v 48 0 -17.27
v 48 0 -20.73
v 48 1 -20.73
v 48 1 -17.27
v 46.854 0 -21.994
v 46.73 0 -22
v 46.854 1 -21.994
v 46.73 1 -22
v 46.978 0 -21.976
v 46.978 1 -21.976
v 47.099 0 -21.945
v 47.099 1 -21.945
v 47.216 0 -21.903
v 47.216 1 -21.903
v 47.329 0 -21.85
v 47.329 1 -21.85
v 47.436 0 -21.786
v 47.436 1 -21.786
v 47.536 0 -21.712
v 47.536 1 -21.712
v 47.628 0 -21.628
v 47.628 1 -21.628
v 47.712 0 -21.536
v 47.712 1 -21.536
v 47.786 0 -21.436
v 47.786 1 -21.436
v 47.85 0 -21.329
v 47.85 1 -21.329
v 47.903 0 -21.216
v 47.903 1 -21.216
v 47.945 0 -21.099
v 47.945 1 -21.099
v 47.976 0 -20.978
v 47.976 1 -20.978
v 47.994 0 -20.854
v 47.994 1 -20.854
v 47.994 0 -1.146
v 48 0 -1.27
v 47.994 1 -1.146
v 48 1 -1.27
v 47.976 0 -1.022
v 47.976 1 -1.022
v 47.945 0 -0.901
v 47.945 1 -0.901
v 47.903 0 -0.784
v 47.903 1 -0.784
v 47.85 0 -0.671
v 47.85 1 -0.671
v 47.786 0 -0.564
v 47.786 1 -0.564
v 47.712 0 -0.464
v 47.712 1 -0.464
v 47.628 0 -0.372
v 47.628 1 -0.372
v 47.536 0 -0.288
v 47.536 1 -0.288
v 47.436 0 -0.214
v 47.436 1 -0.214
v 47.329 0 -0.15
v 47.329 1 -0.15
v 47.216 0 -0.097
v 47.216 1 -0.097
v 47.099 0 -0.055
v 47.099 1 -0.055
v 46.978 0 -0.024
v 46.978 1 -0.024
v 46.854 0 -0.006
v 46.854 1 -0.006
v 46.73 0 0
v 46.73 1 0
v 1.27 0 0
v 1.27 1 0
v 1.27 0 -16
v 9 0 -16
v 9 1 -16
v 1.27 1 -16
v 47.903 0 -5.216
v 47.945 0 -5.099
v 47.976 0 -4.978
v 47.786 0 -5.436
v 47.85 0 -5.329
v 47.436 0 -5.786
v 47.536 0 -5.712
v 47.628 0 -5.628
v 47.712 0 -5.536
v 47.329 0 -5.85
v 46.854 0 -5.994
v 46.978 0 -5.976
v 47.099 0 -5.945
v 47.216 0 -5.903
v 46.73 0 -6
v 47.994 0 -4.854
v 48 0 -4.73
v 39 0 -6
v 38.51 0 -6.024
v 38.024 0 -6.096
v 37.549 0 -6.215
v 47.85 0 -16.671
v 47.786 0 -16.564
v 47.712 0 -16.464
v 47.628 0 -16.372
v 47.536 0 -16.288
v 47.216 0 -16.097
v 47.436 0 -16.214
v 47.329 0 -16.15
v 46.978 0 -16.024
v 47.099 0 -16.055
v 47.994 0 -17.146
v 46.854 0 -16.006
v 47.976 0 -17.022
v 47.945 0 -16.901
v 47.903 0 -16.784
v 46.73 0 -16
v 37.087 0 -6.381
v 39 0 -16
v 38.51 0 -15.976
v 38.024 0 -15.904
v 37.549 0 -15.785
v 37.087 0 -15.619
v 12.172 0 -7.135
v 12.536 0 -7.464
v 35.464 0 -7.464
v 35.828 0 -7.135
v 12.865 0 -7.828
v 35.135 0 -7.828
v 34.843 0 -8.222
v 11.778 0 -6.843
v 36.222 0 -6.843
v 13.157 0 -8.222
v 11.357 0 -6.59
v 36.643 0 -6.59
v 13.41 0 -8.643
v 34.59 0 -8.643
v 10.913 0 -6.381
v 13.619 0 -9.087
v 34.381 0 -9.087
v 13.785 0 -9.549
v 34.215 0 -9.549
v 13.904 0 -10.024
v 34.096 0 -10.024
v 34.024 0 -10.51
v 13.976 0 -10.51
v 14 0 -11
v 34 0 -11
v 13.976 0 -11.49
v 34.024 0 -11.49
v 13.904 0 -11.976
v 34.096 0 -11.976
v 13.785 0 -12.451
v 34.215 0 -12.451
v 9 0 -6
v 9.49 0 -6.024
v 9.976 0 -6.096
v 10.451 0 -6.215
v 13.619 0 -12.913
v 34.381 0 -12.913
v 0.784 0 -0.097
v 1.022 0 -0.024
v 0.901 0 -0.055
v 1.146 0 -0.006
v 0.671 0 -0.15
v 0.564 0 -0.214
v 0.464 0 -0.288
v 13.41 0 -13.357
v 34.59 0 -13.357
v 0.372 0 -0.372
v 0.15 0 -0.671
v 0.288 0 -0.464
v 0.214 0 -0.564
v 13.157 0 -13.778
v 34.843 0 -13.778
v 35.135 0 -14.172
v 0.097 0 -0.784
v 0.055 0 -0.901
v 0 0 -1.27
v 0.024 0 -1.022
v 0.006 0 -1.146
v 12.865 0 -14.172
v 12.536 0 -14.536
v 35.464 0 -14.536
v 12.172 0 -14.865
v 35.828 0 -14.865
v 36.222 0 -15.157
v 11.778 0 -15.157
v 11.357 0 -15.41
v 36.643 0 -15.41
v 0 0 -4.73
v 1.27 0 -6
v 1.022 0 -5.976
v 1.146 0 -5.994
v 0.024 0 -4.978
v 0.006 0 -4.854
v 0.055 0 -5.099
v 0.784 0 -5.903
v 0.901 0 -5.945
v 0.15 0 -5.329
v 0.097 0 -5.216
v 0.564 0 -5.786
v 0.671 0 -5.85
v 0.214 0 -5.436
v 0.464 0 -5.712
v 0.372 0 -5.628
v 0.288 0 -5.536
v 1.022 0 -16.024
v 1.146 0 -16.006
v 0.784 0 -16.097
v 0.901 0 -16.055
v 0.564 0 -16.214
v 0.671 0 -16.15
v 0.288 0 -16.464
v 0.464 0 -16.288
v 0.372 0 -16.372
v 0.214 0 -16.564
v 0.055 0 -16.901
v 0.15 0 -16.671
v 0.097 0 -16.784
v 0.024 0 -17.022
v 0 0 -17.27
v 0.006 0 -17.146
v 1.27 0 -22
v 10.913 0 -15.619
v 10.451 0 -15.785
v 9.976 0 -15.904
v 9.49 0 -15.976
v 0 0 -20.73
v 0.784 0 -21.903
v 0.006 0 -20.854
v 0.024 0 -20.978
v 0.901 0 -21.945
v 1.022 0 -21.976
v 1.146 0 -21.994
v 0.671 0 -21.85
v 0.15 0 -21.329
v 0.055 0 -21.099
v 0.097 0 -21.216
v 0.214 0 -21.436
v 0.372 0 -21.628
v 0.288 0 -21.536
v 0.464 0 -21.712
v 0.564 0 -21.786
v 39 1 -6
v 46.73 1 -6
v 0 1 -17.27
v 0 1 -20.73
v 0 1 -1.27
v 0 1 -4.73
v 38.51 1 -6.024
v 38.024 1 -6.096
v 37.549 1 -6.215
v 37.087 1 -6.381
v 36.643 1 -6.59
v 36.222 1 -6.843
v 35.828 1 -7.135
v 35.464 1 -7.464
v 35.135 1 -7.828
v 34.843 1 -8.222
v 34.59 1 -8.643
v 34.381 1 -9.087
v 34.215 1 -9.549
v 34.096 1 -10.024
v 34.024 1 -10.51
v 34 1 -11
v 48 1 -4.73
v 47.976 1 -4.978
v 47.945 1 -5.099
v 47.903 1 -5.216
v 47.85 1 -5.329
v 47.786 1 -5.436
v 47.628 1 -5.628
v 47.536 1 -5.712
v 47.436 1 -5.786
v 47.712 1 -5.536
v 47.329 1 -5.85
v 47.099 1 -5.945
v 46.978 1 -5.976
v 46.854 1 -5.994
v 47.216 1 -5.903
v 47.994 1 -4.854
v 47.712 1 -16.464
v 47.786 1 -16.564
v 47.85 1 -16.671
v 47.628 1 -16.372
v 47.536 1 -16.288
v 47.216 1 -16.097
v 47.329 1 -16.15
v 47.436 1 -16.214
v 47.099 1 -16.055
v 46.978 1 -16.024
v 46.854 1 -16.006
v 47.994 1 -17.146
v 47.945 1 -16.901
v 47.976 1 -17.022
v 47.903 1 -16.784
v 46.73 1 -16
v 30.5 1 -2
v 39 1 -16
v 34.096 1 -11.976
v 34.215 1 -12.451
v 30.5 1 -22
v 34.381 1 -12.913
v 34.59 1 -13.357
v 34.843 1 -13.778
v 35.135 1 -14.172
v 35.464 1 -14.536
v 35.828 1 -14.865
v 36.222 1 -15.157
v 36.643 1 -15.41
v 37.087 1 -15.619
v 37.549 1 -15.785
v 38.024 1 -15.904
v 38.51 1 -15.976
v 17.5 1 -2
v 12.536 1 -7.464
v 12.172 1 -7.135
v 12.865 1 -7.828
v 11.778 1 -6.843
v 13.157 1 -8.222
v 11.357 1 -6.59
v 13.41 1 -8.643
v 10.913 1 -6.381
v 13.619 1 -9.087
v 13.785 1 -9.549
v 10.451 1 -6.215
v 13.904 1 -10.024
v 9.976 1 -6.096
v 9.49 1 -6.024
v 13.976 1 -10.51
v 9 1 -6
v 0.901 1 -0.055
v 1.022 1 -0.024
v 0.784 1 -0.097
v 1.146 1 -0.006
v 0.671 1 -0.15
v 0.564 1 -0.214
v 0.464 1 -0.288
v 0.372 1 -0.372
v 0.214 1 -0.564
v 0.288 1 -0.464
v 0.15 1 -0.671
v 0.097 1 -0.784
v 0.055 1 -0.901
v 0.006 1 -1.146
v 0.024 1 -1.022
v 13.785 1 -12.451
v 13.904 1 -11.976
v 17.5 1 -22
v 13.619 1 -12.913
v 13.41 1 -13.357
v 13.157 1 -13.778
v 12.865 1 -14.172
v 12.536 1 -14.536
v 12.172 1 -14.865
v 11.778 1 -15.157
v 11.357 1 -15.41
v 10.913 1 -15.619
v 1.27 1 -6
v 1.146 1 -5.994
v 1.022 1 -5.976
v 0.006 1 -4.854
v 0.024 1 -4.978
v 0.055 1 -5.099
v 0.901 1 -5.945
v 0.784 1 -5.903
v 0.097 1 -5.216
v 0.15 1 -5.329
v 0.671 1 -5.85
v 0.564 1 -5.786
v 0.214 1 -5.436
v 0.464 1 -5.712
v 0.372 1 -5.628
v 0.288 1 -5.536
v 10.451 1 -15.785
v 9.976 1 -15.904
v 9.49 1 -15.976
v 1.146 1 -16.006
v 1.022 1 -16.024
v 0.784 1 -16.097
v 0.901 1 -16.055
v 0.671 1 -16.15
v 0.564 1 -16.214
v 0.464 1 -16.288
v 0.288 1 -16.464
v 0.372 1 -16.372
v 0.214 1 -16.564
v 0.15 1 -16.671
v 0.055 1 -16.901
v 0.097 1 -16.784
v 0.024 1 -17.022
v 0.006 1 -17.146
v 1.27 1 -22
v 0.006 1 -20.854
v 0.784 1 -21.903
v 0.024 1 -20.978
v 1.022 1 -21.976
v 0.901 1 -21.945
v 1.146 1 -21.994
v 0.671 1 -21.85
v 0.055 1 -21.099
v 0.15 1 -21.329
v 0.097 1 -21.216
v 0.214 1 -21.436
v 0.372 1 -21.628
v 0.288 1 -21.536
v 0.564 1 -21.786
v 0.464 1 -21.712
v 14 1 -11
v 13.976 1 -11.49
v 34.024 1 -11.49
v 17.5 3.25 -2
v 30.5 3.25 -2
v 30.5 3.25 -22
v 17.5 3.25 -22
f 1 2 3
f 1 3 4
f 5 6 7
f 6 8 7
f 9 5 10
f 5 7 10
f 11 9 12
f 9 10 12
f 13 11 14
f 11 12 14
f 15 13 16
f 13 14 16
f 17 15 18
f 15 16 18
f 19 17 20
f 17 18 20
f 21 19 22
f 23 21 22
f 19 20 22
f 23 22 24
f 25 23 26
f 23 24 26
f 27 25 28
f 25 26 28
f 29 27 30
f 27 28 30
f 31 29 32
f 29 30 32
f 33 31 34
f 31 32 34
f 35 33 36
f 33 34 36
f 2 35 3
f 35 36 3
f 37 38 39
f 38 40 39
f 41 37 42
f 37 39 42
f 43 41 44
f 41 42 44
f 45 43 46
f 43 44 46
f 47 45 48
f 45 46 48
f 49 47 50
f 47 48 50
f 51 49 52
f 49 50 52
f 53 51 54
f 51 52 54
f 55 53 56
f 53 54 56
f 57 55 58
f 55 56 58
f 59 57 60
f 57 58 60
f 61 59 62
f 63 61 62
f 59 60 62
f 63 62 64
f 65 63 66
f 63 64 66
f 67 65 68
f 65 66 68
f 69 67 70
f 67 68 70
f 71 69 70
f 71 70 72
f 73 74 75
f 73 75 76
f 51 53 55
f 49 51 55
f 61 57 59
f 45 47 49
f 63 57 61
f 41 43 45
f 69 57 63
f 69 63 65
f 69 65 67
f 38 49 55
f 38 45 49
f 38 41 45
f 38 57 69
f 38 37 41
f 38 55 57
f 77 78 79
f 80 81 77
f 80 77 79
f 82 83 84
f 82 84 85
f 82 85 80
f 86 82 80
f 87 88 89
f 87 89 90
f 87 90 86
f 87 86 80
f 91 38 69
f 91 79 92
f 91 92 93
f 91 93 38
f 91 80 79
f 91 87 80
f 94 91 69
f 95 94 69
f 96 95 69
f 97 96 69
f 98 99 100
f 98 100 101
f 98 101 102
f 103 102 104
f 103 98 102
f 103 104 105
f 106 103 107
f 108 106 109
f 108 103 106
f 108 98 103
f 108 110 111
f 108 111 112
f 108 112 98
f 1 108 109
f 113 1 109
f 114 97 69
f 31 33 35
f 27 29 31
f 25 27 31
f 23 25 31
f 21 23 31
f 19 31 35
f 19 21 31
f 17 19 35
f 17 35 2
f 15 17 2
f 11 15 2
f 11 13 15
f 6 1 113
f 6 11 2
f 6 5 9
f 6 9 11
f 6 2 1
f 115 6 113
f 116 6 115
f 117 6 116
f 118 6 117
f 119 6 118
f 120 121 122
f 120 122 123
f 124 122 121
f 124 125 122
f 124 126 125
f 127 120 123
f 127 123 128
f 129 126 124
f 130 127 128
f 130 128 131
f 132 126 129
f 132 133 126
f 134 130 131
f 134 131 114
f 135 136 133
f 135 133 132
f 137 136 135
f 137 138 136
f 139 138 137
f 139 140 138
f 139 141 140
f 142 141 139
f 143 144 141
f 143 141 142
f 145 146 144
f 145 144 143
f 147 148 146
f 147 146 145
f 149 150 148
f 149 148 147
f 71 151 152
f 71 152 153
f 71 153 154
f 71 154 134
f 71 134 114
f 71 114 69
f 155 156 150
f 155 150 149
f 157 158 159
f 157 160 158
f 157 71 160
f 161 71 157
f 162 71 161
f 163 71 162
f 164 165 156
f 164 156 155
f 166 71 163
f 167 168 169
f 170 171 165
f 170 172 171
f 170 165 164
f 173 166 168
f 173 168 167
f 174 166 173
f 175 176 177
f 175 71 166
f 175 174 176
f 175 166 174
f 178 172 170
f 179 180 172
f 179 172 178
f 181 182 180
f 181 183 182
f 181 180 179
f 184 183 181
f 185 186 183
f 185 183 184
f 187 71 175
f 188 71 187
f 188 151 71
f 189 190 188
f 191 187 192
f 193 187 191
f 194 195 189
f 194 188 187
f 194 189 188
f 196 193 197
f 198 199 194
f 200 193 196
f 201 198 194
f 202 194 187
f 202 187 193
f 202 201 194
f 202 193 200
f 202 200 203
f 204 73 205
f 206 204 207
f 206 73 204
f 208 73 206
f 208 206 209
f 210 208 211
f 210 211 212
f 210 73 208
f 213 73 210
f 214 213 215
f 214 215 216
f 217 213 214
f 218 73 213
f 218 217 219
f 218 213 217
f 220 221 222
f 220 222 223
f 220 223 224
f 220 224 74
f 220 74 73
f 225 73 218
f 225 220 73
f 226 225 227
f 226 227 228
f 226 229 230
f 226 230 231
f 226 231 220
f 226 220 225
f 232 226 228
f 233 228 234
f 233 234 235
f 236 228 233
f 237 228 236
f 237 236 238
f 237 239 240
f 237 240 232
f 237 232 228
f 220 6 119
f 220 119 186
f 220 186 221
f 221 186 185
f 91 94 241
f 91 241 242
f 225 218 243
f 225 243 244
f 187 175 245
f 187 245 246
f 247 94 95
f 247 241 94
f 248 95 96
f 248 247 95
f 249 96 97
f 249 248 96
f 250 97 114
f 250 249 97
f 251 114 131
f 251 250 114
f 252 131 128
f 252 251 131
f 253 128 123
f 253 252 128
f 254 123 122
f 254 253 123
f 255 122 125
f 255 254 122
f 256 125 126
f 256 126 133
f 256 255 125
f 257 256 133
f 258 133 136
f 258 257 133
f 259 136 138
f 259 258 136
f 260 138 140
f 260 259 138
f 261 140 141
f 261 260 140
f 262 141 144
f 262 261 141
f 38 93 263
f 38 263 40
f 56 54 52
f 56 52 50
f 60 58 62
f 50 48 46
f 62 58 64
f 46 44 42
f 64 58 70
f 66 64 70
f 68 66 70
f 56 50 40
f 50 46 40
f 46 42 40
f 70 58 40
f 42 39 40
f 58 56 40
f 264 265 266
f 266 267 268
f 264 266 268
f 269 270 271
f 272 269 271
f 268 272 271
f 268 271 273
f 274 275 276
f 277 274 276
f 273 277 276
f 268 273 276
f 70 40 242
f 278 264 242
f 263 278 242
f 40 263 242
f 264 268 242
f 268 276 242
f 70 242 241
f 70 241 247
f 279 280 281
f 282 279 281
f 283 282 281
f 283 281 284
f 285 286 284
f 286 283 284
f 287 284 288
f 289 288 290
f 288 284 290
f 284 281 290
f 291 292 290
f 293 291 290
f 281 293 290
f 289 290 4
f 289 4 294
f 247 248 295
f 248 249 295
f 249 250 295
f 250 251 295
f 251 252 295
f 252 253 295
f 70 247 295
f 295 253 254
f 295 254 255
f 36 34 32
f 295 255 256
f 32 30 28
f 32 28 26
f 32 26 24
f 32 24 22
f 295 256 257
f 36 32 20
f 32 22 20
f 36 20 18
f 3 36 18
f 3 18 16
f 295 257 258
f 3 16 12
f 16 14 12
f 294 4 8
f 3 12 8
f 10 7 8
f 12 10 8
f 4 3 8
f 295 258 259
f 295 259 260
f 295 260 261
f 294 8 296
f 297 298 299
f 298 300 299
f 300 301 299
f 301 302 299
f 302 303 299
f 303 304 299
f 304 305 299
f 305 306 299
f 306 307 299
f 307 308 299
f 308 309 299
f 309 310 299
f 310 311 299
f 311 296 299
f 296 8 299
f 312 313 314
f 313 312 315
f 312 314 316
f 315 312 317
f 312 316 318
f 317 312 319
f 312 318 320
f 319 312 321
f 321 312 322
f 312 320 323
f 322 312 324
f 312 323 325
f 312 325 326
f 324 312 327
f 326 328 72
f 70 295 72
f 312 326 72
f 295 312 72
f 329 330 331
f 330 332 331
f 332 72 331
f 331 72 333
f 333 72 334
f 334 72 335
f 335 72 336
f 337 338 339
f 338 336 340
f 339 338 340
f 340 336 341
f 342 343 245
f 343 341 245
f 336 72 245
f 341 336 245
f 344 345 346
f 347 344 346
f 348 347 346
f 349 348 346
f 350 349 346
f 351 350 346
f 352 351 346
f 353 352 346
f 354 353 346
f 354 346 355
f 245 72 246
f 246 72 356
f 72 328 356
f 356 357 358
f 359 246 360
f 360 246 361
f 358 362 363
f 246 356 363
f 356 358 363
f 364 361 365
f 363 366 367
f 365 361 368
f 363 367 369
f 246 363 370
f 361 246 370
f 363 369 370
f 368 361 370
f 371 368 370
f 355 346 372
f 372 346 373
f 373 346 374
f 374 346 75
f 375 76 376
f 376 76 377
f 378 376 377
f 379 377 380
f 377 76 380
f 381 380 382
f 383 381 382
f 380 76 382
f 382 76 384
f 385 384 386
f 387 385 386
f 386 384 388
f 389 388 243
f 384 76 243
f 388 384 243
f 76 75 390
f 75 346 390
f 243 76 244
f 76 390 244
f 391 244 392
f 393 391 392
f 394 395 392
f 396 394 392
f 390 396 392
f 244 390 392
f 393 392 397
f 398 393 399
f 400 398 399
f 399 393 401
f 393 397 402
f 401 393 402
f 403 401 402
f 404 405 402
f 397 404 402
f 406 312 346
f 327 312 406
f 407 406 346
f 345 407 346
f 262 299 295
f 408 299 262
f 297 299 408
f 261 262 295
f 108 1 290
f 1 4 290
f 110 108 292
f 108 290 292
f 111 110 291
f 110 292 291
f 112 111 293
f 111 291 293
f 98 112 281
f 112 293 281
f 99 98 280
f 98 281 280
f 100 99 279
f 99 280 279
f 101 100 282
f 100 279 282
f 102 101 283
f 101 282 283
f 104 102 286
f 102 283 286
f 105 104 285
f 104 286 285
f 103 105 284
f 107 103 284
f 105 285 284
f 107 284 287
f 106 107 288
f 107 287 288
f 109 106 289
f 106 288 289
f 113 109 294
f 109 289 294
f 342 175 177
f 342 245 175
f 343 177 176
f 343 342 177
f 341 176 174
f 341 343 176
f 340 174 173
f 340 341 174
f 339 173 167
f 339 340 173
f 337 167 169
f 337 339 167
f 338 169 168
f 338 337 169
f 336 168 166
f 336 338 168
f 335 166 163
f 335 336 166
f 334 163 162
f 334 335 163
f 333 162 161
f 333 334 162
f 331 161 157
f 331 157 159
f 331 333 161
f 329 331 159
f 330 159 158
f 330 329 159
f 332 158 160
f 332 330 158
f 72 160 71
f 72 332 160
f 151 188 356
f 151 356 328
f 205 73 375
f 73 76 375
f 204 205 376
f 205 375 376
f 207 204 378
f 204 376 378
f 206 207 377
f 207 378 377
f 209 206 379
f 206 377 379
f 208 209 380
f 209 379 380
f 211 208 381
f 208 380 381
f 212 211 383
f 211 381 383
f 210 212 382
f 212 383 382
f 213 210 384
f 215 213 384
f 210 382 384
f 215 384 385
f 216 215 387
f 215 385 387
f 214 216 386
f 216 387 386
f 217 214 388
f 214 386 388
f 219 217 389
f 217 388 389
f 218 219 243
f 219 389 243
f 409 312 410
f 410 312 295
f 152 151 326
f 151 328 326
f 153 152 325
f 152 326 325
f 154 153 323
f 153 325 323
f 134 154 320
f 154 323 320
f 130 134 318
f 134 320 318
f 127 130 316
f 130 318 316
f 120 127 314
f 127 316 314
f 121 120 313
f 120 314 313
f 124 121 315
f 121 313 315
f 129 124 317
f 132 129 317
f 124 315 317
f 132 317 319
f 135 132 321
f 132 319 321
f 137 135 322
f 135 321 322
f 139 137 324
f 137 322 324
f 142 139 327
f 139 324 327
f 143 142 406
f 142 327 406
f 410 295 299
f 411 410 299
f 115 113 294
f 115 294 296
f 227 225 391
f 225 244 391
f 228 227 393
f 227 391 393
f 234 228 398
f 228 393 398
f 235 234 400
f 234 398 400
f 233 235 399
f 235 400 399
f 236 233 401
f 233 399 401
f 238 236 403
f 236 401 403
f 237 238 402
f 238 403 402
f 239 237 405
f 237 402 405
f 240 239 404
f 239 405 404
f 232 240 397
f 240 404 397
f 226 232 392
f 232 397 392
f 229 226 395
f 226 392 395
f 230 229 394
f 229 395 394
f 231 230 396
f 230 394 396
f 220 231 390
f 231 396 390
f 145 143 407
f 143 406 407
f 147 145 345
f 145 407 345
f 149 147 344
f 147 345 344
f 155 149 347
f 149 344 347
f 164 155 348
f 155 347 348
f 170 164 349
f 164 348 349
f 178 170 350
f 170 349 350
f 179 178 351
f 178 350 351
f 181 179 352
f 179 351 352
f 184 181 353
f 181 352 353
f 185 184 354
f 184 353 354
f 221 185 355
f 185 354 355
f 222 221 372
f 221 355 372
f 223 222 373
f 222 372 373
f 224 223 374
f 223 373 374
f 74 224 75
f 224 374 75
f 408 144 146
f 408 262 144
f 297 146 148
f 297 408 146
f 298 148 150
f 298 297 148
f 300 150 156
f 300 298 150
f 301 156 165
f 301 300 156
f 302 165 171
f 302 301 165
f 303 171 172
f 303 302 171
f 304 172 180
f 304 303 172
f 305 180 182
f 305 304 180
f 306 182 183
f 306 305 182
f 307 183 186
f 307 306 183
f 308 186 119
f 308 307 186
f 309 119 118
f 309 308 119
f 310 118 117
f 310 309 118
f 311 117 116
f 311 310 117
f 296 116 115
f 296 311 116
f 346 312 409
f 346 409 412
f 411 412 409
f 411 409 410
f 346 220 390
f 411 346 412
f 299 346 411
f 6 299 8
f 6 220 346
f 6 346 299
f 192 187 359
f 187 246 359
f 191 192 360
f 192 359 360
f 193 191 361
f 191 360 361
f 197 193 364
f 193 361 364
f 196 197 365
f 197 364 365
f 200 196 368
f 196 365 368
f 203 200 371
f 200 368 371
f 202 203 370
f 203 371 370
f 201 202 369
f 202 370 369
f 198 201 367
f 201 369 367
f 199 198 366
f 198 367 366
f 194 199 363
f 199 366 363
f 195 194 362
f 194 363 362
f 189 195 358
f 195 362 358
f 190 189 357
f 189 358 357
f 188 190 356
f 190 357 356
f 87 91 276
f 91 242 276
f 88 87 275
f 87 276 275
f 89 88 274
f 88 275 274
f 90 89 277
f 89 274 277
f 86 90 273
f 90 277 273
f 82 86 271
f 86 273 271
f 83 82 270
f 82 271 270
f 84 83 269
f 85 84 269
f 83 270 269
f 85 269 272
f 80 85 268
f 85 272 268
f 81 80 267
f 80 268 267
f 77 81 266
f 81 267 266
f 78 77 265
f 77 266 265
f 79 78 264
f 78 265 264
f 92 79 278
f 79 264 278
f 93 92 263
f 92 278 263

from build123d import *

# Parameters (mm, degrees)
BOSS_EXTRUDE1_DEPTH = 1
FILLET1_R           = 1.27
FILLET2_R           = 5
SKETCH2_W           = 13
SKETCH2_H           = 20
BOSS_EXTRUDE2_DEPTH = 2.25


with BuildPart() as part:
    # Sketch1 → Boss-Extrude1 (new body)
    with BuildSketch(Plane(origin=(0, 0, 0), x_dir=(1, 0, 0), z_dir=(0, 1, 0))):
        Polygon((0, 0), (0, 6), (14, 6), (14, 16), (0, 16), (0, 22), (48, 22), (48, 16), (34, 16), (34, 6), (48, 6), (48, 0), align=None)
    extrude(amount=BOSS_EXTRUDE1_DEPTH)

    # Fillet1
    fillet1_edges = [part.edges().sort_by_distance(p)[0] for p in [
        (0, 0.5, 0),
        (0, 0.5, -6),
        (0, 0.5, -16),
        (0, 0.5, -22),
        (48, 0.5, -22),
        (48, 0.5, -16),
        (48, 0.5, -6),
        (48, 0.5, 0),
    ]]
    fillet(fillet1_edges, radius=FILLET1_R)

    # Fillet2
    fillet2_edges = [part.edges().sort_by_distance(p)[0] for p in [
        (34, 0.5, -6),
        (34, 0.5, -16),
        (14, 0.5, -6),
        (14, 0.5, -16),
    ]]
    fillet(fillet2_edges, radius=FILLET2_R - 0.0001)  # a hair under: the kernel refuses the full size

    # Sketch2 → Boss-Extrude2 (add)
    with BuildSketch(Plane(origin=(0, 1, 0), x_dir=(1, 0, 0), z_dir=(0, 1, 0))):
        with Locations((24, 12)):
            Rectangle(SKETCH2_W, SKETCH2_H)
    extrude(amount=BOSS_EXTRUDE2_DEPTH)


solid = part.part
